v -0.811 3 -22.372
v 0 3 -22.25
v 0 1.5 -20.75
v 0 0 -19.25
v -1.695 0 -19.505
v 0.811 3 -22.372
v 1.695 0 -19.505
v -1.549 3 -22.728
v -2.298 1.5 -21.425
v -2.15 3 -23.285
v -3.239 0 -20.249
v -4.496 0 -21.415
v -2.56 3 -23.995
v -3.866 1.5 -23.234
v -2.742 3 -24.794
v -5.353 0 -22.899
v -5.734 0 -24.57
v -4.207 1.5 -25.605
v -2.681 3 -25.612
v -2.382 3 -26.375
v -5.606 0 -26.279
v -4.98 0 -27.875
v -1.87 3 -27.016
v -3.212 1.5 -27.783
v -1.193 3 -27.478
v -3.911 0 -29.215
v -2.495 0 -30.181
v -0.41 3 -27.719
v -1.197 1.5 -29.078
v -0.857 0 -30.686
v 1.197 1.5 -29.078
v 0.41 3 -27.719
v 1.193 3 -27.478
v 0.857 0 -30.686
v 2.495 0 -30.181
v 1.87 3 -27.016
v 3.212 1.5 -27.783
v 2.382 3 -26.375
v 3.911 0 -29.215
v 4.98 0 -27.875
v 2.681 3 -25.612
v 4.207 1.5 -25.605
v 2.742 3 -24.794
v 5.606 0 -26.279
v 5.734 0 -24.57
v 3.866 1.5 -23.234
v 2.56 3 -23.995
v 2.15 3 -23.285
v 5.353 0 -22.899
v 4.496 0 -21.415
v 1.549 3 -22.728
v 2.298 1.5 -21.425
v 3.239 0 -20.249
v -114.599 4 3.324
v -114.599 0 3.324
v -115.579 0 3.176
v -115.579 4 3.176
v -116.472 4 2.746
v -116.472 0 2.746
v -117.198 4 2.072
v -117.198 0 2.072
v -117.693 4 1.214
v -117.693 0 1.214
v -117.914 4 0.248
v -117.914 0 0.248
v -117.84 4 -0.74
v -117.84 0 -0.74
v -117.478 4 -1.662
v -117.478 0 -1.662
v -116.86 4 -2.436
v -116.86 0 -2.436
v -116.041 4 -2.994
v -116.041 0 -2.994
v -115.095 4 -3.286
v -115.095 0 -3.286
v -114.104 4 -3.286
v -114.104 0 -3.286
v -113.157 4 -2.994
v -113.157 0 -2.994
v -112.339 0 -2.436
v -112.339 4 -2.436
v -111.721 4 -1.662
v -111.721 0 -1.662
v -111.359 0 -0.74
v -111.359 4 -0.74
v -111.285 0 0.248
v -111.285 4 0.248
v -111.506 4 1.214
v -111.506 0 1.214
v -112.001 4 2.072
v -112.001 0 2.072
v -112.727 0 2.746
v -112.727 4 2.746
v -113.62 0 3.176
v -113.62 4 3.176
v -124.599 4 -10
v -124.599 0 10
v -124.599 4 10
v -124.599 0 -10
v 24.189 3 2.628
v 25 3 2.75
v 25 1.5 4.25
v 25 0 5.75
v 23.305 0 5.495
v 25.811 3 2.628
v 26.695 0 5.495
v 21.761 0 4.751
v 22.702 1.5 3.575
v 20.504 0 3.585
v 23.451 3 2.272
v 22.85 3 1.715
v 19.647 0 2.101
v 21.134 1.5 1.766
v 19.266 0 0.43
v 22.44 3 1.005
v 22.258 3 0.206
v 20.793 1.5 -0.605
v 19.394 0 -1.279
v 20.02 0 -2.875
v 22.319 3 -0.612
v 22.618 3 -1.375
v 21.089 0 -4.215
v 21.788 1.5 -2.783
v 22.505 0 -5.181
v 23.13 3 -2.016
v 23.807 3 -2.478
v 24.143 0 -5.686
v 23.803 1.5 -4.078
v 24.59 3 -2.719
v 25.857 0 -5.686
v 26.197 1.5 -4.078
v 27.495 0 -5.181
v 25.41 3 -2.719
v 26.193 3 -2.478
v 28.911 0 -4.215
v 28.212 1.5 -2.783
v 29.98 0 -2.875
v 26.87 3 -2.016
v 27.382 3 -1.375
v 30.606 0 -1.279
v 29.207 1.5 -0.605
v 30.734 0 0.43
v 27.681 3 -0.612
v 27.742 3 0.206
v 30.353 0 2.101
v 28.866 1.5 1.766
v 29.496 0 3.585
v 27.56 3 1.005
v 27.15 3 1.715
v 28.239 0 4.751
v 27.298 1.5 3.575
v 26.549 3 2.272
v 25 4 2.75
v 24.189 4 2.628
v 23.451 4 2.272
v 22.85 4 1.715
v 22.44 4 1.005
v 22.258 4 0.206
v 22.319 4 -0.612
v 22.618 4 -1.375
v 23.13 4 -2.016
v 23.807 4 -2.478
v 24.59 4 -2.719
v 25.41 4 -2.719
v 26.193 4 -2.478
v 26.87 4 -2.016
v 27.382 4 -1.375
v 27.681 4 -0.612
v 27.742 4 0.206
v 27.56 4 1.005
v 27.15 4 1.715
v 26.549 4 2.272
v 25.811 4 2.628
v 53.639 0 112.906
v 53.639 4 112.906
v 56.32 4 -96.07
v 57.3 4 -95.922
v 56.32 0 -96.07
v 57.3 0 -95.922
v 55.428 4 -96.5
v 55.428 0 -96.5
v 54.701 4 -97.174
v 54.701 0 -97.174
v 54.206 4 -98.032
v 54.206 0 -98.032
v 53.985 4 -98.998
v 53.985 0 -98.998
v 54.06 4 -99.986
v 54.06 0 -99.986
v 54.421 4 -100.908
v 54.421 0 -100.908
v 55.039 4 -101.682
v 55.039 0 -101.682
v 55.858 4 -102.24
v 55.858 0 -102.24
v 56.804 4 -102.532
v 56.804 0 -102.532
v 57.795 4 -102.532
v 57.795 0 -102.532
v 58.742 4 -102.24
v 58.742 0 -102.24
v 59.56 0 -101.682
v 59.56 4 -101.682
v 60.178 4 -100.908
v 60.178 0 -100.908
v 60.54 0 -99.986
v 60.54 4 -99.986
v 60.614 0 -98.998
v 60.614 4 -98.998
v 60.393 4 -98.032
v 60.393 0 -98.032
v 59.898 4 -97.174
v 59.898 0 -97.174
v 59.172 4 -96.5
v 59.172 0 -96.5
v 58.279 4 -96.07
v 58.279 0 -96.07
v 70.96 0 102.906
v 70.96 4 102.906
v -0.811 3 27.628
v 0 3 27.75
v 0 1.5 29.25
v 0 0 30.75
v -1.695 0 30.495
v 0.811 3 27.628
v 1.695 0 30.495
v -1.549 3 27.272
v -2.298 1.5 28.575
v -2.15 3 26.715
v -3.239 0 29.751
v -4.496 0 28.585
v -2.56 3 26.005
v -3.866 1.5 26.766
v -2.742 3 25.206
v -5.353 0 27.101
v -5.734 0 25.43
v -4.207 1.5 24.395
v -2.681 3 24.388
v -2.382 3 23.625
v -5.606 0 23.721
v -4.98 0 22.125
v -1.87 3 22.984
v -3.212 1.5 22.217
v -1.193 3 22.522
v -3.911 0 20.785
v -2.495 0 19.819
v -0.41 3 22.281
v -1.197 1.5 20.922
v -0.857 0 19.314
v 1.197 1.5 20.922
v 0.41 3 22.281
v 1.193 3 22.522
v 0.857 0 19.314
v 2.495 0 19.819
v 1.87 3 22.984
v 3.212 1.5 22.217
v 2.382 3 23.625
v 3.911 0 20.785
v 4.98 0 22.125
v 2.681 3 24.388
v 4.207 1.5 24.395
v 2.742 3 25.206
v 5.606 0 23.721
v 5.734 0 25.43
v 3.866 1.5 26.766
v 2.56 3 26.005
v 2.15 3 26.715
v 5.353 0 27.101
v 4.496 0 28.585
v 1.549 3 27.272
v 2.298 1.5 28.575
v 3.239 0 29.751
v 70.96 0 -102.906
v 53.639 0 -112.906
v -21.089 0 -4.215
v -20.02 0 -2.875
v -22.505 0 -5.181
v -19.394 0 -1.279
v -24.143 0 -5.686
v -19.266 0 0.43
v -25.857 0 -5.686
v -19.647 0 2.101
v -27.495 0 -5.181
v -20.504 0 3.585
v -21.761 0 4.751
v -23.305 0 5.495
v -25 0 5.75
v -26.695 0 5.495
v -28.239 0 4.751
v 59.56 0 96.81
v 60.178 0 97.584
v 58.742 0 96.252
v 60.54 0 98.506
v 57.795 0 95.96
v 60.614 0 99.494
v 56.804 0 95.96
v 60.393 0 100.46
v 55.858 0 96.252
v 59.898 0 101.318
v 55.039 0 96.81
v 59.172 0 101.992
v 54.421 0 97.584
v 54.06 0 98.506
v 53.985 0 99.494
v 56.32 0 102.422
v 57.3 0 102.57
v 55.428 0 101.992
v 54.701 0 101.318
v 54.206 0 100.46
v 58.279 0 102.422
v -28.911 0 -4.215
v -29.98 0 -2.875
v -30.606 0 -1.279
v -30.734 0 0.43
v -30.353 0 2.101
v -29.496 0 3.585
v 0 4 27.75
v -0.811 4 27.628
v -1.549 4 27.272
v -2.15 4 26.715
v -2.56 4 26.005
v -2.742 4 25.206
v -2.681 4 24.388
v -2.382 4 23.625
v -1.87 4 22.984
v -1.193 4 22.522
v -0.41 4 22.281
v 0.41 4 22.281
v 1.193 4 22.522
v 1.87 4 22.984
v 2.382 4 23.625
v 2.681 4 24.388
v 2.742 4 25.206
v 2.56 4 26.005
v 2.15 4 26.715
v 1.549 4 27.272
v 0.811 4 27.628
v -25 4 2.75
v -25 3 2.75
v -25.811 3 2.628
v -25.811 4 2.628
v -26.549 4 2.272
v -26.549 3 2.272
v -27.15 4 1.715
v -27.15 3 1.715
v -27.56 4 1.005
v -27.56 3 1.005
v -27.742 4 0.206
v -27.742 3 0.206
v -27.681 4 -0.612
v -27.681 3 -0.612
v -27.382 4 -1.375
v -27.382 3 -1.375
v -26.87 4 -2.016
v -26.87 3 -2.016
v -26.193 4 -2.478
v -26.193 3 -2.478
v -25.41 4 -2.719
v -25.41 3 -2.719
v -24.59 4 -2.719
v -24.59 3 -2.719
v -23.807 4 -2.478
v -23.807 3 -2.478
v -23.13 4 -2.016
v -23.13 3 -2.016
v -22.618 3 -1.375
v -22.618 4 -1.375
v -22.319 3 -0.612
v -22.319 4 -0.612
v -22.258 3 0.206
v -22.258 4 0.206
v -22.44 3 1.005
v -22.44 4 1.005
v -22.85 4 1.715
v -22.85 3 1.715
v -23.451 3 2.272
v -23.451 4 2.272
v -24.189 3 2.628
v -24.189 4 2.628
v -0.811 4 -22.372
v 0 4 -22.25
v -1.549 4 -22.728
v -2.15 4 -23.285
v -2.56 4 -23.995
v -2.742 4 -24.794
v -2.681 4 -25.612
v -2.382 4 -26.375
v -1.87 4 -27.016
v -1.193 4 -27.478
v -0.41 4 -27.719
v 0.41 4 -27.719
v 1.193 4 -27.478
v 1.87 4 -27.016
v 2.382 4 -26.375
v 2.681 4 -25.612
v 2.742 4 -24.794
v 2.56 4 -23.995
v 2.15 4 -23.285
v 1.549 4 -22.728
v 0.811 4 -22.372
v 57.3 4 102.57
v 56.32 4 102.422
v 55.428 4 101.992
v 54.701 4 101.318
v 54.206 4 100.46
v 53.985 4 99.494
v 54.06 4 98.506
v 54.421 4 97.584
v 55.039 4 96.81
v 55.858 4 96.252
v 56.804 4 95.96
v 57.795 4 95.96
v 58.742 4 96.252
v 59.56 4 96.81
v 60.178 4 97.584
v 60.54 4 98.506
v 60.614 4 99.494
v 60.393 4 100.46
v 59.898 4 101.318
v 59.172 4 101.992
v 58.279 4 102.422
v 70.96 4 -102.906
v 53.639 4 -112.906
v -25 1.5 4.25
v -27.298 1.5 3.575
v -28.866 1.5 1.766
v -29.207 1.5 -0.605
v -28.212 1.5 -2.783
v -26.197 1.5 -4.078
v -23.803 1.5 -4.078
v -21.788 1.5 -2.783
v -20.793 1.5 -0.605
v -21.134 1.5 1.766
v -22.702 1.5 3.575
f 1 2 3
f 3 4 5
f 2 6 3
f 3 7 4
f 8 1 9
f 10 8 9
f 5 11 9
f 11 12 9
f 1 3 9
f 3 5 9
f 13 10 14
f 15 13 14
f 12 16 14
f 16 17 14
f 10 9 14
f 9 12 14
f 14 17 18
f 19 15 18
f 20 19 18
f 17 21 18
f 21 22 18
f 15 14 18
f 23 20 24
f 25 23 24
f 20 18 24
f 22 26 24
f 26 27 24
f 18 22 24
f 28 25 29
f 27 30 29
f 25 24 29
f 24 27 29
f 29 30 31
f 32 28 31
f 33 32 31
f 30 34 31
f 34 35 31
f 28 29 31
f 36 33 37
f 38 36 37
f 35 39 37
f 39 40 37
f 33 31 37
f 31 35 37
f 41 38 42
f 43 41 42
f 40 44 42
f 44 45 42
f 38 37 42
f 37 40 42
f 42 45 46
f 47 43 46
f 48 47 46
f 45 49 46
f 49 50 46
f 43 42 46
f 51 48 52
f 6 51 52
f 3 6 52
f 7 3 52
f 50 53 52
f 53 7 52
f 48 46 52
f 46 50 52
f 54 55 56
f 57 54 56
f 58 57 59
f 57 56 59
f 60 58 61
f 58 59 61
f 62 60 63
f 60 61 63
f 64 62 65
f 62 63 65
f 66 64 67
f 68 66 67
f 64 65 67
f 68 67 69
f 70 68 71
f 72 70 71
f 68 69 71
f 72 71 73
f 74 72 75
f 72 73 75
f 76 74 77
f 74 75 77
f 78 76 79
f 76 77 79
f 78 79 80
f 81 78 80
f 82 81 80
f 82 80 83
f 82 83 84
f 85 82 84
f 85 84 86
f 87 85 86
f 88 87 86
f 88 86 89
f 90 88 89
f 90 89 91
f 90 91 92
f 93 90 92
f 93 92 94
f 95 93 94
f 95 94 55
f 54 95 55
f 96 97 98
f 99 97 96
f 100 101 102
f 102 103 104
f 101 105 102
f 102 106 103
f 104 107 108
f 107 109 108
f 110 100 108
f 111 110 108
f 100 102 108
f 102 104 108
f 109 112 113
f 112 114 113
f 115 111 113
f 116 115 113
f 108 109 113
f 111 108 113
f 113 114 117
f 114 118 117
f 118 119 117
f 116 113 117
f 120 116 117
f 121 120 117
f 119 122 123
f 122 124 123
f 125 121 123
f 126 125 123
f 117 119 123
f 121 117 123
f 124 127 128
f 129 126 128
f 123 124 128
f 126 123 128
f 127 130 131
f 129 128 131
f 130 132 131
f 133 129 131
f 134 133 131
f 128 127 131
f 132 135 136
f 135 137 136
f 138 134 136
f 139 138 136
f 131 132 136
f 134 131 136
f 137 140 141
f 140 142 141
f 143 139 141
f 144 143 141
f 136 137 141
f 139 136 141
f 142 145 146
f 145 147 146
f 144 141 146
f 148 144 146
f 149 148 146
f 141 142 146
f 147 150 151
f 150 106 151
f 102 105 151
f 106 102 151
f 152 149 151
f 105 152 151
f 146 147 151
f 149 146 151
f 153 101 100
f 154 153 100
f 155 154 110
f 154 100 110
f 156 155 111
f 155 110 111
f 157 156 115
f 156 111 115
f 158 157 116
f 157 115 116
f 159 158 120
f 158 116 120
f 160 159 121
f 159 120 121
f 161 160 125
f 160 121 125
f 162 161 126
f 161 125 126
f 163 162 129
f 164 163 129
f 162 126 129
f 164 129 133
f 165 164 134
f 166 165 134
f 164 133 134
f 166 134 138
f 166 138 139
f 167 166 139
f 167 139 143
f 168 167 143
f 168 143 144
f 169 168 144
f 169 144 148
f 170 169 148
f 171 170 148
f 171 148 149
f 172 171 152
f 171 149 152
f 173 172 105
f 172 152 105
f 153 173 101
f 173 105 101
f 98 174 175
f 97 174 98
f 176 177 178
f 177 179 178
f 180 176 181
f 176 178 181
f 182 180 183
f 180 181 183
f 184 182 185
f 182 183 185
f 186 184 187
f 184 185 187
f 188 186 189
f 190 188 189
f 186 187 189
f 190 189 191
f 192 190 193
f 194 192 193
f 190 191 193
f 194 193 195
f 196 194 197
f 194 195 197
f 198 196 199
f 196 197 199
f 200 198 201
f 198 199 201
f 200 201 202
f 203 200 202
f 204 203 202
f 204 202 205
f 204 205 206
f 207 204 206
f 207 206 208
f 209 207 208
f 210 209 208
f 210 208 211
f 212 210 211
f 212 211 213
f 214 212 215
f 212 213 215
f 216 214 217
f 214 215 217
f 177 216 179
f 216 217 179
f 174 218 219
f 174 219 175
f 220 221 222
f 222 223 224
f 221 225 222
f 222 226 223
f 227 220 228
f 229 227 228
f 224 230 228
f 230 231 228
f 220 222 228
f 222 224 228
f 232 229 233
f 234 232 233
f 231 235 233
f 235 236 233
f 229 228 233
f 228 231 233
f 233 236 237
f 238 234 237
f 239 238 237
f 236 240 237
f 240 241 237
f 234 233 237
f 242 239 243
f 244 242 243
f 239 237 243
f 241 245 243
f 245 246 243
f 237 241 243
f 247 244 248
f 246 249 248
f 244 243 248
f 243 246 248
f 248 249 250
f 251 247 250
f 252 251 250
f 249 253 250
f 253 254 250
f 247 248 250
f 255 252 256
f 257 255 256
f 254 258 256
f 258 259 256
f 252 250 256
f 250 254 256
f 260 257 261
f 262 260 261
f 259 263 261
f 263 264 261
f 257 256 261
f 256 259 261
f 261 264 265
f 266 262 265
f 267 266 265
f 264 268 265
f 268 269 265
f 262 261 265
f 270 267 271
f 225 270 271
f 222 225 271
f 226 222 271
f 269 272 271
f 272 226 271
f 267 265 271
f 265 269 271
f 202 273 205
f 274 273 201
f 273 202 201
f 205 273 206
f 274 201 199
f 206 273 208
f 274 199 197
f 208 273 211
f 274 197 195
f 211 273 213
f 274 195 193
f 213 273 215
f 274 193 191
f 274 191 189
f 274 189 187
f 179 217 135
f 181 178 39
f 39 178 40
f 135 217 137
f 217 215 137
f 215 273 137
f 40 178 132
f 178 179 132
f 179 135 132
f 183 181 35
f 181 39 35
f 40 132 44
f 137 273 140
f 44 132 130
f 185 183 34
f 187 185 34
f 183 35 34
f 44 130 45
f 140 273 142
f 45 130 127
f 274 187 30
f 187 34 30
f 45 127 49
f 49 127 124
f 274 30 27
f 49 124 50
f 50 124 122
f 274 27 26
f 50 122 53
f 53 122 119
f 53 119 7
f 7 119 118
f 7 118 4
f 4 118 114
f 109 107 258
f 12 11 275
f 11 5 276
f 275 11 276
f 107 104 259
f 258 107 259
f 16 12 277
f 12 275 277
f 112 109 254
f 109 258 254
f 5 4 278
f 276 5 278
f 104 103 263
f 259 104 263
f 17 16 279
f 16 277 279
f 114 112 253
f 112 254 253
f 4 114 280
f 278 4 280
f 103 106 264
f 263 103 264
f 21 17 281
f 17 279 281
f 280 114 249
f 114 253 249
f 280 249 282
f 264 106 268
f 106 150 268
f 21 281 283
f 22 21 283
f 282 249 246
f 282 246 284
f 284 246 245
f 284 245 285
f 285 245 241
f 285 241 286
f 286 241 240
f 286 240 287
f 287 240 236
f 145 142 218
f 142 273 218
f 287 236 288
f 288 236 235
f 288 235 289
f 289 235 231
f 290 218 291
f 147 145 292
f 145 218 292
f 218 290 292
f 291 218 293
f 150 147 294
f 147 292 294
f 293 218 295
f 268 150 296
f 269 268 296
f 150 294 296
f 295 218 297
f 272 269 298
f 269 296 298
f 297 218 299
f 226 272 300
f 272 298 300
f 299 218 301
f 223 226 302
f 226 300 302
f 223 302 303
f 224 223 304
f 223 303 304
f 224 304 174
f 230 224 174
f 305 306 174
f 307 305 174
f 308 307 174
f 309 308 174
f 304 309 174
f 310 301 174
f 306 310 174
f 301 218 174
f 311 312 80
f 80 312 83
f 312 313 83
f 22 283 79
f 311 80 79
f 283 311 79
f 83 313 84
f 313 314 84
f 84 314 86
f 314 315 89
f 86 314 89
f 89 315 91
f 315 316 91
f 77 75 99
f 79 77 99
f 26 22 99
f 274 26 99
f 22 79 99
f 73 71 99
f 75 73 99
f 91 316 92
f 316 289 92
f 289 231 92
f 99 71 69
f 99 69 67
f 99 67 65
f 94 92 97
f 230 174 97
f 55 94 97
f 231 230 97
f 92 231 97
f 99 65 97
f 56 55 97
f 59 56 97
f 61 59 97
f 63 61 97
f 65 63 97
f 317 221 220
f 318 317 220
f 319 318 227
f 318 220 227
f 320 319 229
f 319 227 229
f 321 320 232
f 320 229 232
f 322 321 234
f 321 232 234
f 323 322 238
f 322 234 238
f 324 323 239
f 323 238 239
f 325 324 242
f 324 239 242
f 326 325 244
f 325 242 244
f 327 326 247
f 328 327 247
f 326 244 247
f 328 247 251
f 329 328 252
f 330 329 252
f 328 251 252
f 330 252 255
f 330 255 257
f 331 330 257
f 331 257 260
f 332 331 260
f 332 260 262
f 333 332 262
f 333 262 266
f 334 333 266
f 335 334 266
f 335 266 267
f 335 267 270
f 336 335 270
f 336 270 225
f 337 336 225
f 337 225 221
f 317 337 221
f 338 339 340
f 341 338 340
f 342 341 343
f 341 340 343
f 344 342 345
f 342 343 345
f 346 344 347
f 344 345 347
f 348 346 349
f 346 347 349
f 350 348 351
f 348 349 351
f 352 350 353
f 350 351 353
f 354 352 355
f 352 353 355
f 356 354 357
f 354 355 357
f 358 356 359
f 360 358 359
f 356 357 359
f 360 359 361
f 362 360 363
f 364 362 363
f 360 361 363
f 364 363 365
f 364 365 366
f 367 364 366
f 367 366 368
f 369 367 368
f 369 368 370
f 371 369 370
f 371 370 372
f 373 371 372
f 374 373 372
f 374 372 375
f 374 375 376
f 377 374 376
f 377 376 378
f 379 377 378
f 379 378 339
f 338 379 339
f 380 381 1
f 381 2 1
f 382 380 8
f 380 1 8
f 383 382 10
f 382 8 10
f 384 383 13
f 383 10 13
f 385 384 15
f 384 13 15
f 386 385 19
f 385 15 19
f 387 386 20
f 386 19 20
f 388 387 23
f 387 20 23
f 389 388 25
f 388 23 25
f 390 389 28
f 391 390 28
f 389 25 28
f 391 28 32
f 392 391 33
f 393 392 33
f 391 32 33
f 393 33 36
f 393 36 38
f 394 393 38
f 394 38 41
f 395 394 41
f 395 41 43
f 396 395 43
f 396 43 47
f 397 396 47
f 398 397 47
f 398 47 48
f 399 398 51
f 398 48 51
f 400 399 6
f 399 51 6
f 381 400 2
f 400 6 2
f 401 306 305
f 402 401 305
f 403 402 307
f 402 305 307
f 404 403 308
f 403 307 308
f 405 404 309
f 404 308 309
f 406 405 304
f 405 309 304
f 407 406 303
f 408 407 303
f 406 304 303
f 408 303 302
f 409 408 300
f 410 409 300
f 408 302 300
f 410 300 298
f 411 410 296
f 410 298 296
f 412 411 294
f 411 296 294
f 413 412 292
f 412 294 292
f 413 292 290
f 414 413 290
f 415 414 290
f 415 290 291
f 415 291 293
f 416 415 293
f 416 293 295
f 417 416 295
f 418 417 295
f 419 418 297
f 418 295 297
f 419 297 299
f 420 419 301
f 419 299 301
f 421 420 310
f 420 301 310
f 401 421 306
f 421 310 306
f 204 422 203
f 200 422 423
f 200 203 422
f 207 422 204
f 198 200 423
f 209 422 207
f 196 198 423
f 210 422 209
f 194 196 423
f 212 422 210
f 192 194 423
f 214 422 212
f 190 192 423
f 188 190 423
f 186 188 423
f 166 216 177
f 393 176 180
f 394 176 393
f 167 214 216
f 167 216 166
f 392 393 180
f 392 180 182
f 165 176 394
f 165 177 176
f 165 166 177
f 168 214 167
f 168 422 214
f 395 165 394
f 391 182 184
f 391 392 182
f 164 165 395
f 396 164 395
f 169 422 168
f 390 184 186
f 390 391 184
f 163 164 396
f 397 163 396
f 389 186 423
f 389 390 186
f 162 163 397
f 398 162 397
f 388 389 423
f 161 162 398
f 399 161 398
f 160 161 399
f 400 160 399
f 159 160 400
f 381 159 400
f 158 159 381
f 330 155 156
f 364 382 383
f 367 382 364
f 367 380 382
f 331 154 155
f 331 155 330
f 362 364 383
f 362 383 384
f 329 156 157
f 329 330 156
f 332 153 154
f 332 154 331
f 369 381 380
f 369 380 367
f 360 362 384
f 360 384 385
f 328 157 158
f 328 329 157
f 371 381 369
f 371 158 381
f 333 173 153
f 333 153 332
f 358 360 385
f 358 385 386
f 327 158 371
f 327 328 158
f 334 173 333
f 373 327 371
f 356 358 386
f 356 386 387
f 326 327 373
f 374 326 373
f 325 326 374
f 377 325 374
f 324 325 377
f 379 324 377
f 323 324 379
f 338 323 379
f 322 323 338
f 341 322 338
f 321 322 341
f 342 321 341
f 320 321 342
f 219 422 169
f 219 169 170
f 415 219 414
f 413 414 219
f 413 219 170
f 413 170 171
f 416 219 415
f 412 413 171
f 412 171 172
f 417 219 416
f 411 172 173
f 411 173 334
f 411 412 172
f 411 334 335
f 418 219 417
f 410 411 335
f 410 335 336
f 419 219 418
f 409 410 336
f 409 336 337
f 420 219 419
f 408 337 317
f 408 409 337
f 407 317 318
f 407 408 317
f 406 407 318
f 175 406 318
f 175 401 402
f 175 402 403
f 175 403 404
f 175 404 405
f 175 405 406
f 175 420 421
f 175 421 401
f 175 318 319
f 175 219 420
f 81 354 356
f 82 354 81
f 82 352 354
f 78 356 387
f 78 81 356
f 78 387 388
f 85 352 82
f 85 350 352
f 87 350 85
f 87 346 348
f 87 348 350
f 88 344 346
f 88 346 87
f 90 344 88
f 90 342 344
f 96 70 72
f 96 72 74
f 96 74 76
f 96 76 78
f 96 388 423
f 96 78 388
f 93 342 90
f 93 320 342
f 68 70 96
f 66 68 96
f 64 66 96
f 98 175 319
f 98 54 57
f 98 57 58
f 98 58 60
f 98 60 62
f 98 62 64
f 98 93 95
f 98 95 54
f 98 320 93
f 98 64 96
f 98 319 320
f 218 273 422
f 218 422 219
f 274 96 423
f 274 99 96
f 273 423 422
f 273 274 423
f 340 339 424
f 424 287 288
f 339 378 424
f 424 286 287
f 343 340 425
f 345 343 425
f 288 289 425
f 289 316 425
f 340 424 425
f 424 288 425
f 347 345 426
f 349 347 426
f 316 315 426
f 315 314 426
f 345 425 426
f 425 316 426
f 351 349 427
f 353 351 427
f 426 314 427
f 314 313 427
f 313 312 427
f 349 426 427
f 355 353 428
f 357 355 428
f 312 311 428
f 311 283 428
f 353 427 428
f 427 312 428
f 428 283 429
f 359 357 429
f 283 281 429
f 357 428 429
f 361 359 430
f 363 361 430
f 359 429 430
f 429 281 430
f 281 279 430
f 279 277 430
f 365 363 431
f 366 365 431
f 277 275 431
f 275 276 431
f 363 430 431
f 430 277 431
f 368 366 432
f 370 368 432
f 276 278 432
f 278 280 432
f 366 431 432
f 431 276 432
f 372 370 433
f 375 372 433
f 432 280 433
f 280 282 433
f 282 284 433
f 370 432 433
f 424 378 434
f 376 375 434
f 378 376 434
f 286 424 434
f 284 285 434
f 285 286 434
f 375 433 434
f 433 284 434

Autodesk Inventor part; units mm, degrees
ref_plane "YZ Plane" through (0, 0, 0) normal (1, 0, 0) x (0, 1, 0)
ref_plane "XZ Plane" through (0, 0, 0) normal (0, 1, 0) x (-1, 0, 0)
ref_plane "XY Plane" through (0, 0, 0) normal (0, 0, 1) x (1, 0, 0)
sketch "Sketch2" plane through (0, 4, 0) normal (0, 1, 0) x (1, 0, 0)
  circle A0 centre (0, 0) radius 40 construction
  line L0 (15.1987, 37) -> (-15.1987, 37)
  line L1 (-15.1987, 37) -> (-15.1987, 57.3146)
  line L2 (0.2732, 67) -> (10.6706, 67)
  line L3 (15.1987, 57.3127) -> (15.1987, 37)
  line L4 (15.1987, -37) -> (-15.1987, -37)
  line L5 (-15.1987, -37) -> (-15.1987, -57.3146)
  line L6 (0.2732, -67) -> (10.6706, -67)
  line L7 (15.1987, -57.3127) -> (15.1987, -37)
  line L8 (-15.1987, 57.3146) -> (-15.1987, 67)
  line L9 (-15.1987, 67) -> (0.2732, 67)
  line L10 (10.6706, 67) -> (15.1987, 67)
  line L11 (15.1987, 67) -> (15.1987, 57.3127)
  line L12 (0.2732, -67) -> (-15.1987, -67)
  line L13 (-15.1987, -57.3146) -> (-15.1987, -67)
  line L14 (10.6706, -67) -> (15.1987, -67)
  line L15 (15.1987, -67) -> (15.1987, -57.3127)
  circle A1 centre (0, 0) radius 70.9599 construction
  line L16 (-124.5994, 10) -> (53.6394, 112.9062) projected
  line L17 (70.9599, 102.9062) -> (70.9599, -102.9062) projected
  point P0 (0, 0)
  dimension "d9" = 80
  dimension "d10" = 74
  dimension "d11" = 30
sketch "Sketch4" plane through (-13.1987, 4, 37) normal (0, 0, 1) x (1, 0, 0)
  circle A0 centre (13.1987, 6) radius 2.75
  circle A1 centre (13.1987, 18) radius 2.75
  line L0 (66.8381, -2) -> (-111.4007, -2) projected
  line L1 (0, 0) -> (0, 18) projected
  line L2 (26.3974, 18) -> (26.3974, 0) projected
  point P0 (13.1987, -4)
  dimension "d35" = 5.5
  dimension "d36" = 12
  dimension "d37" = 8
  dimension "d39" = 26.3974
  dimension "d40" = 13.1987
sketch "Sketch1" plane through (0, 0, 0) normal (0, 1, 0) x (-1, 0, 0)
  line L0 (124.5994, -10) -> (-53.6394, -112.9062)
  line L1 (-70.9599, -102.9062) -> (-70.9599, 102.9062)
  line L2 (-53.6394, 112.9062) -> (124.5994, 10)
  circle A0 centre (0, 0) radius 70.9599 construction
  line L3 (124.5994, 10) -> (124.5994, -10)
  line L4 (-53.6394, -112.9062) -> (-70.9599, -102.9062)
  line L5 (-70.9599, 102.9062) -> (-53.6394, 112.9062)
  circle A1 centre (0, 0) radius 125 construction
  point P0 (141.9199, 0)
  point P1 (-70.9599, -122.9062)
  point P2 (-70.9599, 122.9062)
  dimension "d7" = 250
  dimension "d1" = 20
  dimension "d2" = 20
  dimension "d3" = 20
  dimension "d4" = 20
  dimension "d5" = 20
  dimension "d6" = 20
extrude "Plate1" add sketch "Sketch1" along normal blind 4
sketch "Sketch5" plane through (0, 4, 0) normal (0, 1, 0) x (1, 0, 0)
  circle A0 centre (0, 0) radius 25 construction
  point P0 (-25, 0)
  point P1 (0, 25)
  point P2 (25, 0)
  point P3 (0, -25)
  dimension "d43" = 50
hole "Hole1" at (-25, 4, 0) at (0, 4, -25) at (25, 4, 0) at (0, 4, 25) direction (0, -1, 0) diameter 5.5 end through all
chamfer "Chamfer1" distance 3 angle 45 4 edges at (0, 0, -27.75) (25, 0, -2.75) (-25, 0, -2.75) (0, 0, 22.25)
sketch "Sketch6" plane through (0, 4, 0) normal (0, 1, 0) x (1, 0, 0)
  circle A0 centre (0, 0) radius 114.5994 construction
  line L0 (-124.5994, -10) -> (-124.5994, 10) projected
  point P0 (-114.5994, 0)
  point P1 (57.2997, -99.246)
  point P2 (57.2997, 99.246)
  dimension "d54" = 10
  dimension "d57" = 360
hole "Hole2" at (57.2997, 4, -99.246) at (57.2997, 4, 99.246) at (-114.5994, 4, 0) direction (0, -1, 0) diameter 6.647 end through all thread size "M8x1.25" class "6H" standard "ISO Metric profile"
sketch "Sketch3" plane through (15.1987, 0, 35) normal (0, 0, 1) x (1, 0, 0)
  line L0 (-28.3974, 0) -> (-2, 0)
  line L1 (-2, 0) -> (-2, 30)
  line L2 (-2, 30) -> (-28.3974, 30)
  line L3 (-28.3974, 30) -> (-28.3974, 0)
equation "\"d49\" = Thickness"
equation "\"d40\" = 0.5 * d39"
equation "\"d8\" = Thickness"
equation "\"d2\" = d1"
equation "\"d3\" = d1"
equation "\"d4\" = d3"
equation "\"d5\" = d1"
equation "\"d6\" = d5"
equation "\"BendRadius\" = Thickness"
equation "\"BendReliefWidth\" = Thickness"
equation "\"BendReliefDepth\" = 0.5 * Thickness"
equation "\"CornerReliefSize\" = 4 * Thickness"
equation "\"MinimumRemnant\" = 2 * Thickness"
equation "\"TransitionRadius\" = BendRadius"
equation "\"JacobiRadiusSize\" = BendRadius"
equation "\"GapSize\" = Thickness"
equation "\"Thickness\" = 4"
properties part number "BasePlate" material "Stainless Steel"
